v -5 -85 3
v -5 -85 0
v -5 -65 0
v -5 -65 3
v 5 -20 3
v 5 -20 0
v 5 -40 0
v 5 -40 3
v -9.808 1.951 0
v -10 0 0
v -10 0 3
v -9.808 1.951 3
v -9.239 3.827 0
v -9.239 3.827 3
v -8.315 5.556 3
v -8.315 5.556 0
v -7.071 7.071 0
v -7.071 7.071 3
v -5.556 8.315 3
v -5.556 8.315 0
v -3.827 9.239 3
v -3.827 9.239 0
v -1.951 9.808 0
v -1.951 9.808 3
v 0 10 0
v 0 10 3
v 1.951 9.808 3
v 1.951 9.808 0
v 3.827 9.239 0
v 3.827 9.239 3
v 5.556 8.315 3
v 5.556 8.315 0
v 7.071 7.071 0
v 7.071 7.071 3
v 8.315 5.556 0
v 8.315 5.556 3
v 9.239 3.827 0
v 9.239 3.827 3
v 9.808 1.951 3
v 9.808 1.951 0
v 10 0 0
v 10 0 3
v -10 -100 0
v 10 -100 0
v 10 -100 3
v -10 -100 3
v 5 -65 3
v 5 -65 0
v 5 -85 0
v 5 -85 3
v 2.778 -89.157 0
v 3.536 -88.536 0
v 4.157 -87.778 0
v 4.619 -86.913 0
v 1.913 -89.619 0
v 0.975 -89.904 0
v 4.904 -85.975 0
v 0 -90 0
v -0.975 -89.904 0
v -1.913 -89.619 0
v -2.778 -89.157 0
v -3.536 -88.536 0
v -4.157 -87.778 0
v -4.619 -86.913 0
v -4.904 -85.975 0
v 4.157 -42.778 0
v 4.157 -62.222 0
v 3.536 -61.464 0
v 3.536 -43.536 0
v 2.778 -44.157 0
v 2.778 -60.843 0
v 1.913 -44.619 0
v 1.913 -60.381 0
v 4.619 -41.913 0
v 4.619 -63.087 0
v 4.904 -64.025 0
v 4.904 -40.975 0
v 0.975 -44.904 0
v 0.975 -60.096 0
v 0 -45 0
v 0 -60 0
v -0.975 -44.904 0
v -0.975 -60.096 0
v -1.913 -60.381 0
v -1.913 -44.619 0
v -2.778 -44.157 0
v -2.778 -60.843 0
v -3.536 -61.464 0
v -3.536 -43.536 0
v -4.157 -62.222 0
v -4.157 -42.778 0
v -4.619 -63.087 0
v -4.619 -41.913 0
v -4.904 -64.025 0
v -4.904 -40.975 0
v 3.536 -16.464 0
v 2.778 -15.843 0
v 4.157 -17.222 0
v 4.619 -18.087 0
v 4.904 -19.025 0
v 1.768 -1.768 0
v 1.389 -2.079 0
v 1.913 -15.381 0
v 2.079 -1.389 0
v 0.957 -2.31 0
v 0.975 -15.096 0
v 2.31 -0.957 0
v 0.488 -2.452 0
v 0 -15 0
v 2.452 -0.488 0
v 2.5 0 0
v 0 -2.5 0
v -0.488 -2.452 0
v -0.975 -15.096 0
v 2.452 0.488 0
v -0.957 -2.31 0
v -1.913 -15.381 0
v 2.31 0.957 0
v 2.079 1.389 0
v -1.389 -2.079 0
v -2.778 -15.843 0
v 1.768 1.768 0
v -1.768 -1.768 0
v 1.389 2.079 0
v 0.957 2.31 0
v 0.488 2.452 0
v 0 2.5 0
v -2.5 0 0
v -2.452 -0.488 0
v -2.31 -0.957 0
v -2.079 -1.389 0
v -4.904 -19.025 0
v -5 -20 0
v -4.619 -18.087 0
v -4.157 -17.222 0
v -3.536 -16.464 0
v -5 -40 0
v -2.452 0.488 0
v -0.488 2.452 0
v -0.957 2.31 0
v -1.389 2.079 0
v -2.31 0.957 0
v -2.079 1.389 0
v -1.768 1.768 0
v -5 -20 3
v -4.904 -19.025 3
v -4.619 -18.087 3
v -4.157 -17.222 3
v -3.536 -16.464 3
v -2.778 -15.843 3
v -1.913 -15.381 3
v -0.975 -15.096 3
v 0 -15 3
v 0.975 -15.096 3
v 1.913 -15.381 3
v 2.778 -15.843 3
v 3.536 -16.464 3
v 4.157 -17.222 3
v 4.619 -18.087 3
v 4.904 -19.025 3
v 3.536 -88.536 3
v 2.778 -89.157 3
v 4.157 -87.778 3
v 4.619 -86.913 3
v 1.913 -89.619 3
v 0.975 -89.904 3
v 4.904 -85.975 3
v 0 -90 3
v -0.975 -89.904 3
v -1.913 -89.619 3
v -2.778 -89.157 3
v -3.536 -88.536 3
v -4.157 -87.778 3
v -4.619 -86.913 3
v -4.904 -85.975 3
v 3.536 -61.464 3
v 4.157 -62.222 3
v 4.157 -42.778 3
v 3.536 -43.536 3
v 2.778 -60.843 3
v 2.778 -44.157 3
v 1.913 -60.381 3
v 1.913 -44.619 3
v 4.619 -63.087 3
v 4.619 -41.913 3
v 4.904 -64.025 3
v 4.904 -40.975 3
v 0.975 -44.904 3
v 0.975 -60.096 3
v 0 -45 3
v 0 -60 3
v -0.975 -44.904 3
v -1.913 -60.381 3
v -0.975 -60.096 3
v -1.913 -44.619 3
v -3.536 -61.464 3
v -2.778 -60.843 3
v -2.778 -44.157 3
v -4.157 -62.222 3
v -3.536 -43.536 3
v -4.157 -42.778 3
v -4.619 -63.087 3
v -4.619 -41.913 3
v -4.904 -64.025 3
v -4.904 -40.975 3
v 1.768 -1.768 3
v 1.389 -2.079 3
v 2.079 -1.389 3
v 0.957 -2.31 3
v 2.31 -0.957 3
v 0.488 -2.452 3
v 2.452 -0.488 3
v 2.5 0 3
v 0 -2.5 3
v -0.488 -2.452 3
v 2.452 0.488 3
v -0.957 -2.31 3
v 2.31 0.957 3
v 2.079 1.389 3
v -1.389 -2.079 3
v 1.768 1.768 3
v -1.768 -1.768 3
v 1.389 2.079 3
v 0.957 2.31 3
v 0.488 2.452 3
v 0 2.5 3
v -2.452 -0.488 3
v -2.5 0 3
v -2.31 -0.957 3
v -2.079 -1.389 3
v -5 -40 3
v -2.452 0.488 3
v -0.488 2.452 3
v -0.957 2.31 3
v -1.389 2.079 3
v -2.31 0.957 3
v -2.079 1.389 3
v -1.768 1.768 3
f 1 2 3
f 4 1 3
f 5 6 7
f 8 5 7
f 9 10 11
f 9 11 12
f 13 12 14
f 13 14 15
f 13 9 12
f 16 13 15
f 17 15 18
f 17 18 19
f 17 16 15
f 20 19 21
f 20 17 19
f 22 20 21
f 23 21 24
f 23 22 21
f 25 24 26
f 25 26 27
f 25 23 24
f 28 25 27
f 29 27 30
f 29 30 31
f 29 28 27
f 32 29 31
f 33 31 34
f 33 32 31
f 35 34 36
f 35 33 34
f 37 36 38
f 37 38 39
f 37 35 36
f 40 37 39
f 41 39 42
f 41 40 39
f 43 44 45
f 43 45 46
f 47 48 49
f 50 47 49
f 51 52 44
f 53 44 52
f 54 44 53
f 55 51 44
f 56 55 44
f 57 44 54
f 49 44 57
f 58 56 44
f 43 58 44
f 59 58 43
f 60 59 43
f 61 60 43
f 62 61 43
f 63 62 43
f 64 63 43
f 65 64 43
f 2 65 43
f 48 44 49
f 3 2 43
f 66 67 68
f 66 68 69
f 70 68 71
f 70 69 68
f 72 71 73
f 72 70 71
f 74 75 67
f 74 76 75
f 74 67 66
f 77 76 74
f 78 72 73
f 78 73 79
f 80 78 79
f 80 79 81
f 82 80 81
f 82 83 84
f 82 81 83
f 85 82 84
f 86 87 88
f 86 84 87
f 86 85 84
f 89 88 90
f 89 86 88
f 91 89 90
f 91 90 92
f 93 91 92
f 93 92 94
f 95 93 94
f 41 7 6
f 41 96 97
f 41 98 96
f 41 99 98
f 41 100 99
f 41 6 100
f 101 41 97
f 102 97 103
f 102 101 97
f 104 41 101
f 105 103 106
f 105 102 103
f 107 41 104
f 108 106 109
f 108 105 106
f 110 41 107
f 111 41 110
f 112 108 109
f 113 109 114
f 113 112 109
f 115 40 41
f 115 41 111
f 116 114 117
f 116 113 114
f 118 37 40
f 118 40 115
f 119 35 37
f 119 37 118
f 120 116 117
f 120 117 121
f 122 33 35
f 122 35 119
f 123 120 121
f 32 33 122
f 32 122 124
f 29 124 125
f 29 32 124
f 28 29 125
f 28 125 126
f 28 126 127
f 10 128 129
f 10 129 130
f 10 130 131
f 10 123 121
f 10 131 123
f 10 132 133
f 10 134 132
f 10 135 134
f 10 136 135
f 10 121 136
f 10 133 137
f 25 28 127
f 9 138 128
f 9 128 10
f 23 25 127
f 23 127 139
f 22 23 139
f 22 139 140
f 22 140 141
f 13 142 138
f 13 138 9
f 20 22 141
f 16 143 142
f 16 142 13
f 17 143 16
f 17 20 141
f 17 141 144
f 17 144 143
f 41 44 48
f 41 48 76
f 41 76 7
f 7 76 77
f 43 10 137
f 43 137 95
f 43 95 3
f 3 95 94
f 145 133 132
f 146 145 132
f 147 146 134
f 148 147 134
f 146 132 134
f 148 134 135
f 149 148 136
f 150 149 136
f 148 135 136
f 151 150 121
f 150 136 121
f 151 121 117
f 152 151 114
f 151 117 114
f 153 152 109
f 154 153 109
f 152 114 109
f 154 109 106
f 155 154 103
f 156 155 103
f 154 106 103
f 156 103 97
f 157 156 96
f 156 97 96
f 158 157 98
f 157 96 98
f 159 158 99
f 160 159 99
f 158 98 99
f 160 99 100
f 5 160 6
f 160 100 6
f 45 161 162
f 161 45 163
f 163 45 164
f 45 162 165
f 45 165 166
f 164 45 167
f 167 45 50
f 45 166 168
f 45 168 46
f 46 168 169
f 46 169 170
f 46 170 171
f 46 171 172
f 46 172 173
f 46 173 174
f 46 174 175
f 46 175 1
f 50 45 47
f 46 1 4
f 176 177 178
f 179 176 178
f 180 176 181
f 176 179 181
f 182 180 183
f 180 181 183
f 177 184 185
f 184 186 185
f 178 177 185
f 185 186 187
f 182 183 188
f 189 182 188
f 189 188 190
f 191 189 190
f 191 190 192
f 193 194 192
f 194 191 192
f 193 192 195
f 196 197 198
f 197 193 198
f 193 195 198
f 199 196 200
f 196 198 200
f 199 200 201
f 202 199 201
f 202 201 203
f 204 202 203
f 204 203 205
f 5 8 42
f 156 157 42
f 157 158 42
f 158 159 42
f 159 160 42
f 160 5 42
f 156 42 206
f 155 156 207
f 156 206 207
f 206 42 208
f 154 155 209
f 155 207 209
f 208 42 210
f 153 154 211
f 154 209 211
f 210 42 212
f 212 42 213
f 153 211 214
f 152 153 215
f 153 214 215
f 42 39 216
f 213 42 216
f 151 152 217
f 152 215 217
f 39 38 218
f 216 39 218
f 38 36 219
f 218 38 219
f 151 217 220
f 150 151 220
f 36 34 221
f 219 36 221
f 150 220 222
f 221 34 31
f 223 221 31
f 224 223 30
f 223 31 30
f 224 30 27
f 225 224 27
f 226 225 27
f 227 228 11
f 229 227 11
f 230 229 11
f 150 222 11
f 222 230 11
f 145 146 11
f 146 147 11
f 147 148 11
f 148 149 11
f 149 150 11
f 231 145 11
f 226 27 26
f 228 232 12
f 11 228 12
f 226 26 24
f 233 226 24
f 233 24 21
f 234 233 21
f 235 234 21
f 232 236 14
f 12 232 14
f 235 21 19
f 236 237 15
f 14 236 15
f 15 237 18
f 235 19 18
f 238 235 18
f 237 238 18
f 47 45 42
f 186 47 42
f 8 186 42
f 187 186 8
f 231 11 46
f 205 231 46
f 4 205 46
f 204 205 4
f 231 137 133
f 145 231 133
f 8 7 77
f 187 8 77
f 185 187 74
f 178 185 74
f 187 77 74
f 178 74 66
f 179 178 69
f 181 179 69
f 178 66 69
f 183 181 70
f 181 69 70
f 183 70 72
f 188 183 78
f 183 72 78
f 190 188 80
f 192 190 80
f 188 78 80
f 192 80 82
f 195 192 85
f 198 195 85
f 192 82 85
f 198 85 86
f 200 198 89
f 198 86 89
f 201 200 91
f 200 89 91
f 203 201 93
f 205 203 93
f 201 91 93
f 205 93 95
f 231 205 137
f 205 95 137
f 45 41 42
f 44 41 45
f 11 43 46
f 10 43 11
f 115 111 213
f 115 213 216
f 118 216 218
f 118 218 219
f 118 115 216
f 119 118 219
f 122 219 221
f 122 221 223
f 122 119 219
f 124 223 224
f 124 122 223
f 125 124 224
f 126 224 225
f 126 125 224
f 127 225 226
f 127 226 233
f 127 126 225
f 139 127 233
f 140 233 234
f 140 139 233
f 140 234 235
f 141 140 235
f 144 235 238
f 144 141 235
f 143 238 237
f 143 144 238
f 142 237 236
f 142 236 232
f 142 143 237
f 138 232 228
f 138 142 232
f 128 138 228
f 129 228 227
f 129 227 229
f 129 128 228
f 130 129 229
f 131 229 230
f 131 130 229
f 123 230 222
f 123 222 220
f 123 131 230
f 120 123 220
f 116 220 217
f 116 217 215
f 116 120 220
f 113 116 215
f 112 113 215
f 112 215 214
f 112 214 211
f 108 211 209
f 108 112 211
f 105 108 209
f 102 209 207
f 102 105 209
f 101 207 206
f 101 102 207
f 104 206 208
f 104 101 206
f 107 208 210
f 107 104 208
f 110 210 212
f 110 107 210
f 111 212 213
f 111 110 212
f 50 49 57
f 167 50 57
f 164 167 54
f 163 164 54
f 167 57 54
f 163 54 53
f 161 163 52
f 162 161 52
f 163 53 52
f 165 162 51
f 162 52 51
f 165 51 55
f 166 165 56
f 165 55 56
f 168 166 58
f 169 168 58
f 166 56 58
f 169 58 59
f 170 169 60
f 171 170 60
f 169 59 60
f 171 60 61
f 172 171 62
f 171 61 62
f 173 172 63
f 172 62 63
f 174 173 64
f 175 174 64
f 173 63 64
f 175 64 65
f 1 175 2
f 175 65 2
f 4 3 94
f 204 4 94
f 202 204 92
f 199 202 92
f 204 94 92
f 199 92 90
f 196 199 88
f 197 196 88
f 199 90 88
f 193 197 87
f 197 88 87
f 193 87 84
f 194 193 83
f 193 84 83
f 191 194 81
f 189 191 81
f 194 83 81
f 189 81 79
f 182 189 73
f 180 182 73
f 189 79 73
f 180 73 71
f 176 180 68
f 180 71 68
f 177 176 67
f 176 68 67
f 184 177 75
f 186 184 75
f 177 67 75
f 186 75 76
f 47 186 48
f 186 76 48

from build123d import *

# Parameters (mm, degrees)
SKETCH1_R           = 2.5
BOSS_EXTRUDE1_DEPTH = 3


with BuildPart() as part:
    # Sketch1 → Boss-Extrude1 (new body)
    with BuildSketch(Plane.XY):
        with BuildLine():
            Line((10, 0), (10, -100))
            Line((10, -100), (-10, -100))
            Line((-10, -100), (-10, 0))
            ThreePointArc((-10, 0), (0, 10), (10, 0))
        make_face()
        Circle(SKETCH1_R, mode=Mode.SUBTRACT)
        with BuildLine():
            Line((5, -20), (5, -40))
            ThreePointArc((5, -40), (0, -45), (-5, -40))
            Line((-5, -40), (-5, -20))
            ThreePointArc((-5, -20), (0, -15), (5, -20))
        make_face(mode=Mode.SUBTRACT)
        with BuildLine():
            Line((-5, -85), (-5, -65))
            ThreePointArc((-5, -65), (0, -60), (5, -65))
            Line((5, -65), (5, -85))
            ThreePointArc((5, -85), (0, -90), (-5, -85))
        make_face(mode=Mode.SUBTRACT)
    extrude(amount=BOSS_EXTRUDE1_DEPTH)


solid = part.part
